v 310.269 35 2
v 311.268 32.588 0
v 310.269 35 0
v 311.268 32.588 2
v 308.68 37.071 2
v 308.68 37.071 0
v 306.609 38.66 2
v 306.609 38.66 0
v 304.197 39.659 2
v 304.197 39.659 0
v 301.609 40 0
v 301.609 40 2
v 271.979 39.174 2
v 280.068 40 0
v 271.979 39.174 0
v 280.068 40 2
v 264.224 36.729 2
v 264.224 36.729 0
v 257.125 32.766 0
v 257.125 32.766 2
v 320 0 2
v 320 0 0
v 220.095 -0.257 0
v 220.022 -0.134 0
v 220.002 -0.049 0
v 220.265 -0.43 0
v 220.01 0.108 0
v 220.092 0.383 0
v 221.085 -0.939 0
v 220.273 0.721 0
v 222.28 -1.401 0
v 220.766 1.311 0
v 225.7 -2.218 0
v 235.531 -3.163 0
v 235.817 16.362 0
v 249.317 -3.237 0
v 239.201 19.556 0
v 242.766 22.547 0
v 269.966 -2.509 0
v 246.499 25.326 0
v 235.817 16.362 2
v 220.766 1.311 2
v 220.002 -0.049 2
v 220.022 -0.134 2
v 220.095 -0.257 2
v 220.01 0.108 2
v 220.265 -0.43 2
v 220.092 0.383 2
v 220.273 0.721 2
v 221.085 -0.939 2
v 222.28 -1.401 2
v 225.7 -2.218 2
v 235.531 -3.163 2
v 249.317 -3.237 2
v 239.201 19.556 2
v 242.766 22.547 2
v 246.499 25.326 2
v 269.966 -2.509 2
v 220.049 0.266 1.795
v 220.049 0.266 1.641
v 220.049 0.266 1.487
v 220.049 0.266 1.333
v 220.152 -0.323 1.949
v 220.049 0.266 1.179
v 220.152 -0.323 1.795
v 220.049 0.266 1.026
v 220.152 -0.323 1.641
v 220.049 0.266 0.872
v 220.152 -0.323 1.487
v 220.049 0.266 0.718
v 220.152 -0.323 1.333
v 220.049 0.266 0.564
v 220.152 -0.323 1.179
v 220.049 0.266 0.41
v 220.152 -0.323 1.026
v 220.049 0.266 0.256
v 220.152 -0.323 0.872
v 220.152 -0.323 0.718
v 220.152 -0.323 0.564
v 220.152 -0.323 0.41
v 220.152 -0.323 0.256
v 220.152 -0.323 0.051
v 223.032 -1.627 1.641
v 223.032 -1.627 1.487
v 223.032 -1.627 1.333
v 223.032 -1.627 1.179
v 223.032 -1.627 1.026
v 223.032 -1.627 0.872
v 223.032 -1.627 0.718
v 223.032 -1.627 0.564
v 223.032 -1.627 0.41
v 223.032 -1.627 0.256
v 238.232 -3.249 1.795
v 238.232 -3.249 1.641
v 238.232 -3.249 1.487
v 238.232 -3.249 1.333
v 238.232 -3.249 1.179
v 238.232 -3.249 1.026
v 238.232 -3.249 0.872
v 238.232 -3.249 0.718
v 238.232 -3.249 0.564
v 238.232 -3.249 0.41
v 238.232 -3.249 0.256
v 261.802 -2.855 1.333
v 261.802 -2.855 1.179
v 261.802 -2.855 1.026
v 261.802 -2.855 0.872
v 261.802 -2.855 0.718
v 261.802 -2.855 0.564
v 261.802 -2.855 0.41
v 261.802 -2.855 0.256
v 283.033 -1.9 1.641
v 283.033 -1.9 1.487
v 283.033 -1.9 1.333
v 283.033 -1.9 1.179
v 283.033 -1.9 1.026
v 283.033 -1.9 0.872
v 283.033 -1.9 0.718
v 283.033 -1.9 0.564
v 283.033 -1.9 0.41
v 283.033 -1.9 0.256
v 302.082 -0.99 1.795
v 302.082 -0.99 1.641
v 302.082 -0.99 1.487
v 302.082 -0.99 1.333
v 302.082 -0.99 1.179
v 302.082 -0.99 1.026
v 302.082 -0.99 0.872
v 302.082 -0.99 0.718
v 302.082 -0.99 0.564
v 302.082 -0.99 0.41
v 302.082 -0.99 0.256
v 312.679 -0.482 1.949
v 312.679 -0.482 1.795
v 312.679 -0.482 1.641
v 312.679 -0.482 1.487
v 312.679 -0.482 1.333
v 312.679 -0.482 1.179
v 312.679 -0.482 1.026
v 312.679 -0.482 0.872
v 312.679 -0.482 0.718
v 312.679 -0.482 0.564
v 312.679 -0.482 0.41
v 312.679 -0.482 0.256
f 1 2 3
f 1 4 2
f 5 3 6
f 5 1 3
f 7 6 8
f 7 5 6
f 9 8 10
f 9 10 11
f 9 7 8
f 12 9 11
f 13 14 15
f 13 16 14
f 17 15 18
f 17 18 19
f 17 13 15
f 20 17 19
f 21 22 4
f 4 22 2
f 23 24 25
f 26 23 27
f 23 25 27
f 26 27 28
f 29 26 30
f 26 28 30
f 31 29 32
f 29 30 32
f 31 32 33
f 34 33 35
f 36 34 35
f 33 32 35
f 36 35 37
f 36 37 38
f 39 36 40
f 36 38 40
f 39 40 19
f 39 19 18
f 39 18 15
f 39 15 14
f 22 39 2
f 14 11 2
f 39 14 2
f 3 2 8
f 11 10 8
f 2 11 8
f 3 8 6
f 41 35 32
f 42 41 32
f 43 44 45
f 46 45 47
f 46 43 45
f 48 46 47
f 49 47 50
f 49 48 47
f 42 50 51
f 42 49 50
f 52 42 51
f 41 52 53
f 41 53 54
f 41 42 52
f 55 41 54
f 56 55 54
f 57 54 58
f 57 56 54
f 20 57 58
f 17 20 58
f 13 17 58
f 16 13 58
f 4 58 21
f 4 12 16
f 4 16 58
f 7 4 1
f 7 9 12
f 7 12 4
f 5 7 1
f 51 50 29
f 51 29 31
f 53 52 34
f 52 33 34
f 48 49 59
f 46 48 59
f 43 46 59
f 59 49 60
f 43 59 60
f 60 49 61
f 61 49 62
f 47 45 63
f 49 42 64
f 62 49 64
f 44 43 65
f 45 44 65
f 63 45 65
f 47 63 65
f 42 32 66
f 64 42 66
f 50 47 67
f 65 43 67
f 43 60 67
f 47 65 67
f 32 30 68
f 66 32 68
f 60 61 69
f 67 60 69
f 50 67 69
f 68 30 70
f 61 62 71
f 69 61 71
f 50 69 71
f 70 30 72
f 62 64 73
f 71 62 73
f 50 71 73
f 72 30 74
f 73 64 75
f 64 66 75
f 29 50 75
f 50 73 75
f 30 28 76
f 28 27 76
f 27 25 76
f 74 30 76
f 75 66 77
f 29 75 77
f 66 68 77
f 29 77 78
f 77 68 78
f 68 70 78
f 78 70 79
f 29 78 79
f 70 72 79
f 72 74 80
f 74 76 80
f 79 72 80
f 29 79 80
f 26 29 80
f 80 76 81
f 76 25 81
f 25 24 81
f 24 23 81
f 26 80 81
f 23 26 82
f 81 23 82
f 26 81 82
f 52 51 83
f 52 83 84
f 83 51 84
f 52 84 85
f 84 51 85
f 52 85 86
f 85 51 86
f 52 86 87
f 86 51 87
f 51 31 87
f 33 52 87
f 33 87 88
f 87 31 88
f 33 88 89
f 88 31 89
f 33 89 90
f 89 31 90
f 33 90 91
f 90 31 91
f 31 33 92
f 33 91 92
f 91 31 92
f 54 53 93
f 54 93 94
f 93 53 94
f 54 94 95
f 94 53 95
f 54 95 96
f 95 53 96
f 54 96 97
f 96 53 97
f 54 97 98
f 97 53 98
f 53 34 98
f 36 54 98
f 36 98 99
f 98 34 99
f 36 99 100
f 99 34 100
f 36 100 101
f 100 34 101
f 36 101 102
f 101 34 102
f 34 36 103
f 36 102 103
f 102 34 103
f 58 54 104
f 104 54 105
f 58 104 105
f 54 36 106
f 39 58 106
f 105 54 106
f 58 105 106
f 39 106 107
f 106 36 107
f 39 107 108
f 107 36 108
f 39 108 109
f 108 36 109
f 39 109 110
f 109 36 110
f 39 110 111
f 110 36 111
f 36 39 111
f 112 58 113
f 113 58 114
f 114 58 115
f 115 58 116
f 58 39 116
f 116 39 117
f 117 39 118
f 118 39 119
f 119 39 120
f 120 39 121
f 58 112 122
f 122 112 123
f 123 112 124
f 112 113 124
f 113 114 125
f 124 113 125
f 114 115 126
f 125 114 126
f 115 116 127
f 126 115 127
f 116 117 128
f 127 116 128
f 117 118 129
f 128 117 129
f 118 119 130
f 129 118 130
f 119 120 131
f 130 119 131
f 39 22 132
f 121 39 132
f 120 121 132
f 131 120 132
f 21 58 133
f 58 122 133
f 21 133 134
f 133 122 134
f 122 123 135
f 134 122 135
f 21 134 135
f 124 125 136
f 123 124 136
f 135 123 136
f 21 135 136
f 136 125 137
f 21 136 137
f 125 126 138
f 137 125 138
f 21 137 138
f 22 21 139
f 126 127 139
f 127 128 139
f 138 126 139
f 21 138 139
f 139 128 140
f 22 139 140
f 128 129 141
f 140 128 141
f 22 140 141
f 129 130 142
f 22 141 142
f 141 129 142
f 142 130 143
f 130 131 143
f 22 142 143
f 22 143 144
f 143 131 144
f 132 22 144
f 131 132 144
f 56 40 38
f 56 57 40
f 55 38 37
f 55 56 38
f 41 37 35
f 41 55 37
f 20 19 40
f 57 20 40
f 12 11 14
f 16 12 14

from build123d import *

# Parameters (mm, degrees)
BOSS_EXTRUDE1_DEPTH = 2
FILLET2_R           = 10
FILLET3_R           = 40
FILLET4_R           = 80


# Read off the part's stored shape, not the designer's step: Boss-Extrude1
with BuildPart() as part:
    # Boss-Extrude1 outline → Boss-Extrude1 (new body)
    with BuildSketch(Plane.XY):
        with BuildLine():
            Line((267.455713264, 40), (240.765620284, 21.3113957))
            Line((240.765620284, 21.3113957), (220.765620284, 1.3113957))
            add(Edge.make_bspline(
                [(220.765620284, 1.3113957), (220.72663316, 1.272408575), (220.493626624, 1.032206135), (220.23379921, 0.706351654), (220.061642382, 0.318391358), (220.011602189, 0.139502643), (219.995925197, -0.002861211), (220.008120727, -0.115534154), (220.062041002, -0.21843611), (220.160266844, -0.337962224), (220.314496952, -0.477861912), (220.482600839, -0.598911233), (220.942116034, -0.893723302), (221.892375739, -1.29761444), (223.520457756, -1.784013523), (225.623980896, -2.227885385), (228.177131144, -2.613315253), (231.164121123, -2.919183773), (234.563486569, -3.13704422), (238.352012883, -3.267079886), (242.499561211, -3.312040739), (246.9689457, -3.284920505), (251.715996006, -3.193186176), (256.691386013, -3.047617228), (261.841513678, -2.857541871), (267.108766757, -2.638288597), (272.431487903, -2.398822278), (277.745717707, -2.151491009), (282.986461691, -1.901966392), (288.089354259, -1.658423301), (292.991669653, -1.423290263), (297.633381787, -1.201968071), (301.957838568, -0.995171113), (305.91027468, -0.808454245), (309.445141673, -0.639954363), (312.505114519, -0.492661458), (315.08917453, -0.359561985), (317.064072102, -0.250243866), (318.667228537, -0.135455891), (319.33987673, -0.063054382), (319.997867718, -0.003800804), (320, 0)],
                knots=[0.495962564, 0.495962564, 0.495962564, 0.495962564, 0.496775026, 0.500888993, 0.502031934, 0.503032492, 0.503621391, 0.504143577, 0.504679782, 0.505310677, 0.506426476, 0.507746346, 0.508370255, 0.514496902, 0.522891546, 0.533497445, 0.54624431, 0.561059304, 0.577878564, 0.59660209, 0.617103044, 0.639204159, 0.662685634, 0.687304872, 0.712801248, 0.738887215, 0.765254171, 0.791582967, 0.817548904, 0.842831994, 0.867120728, 0.890117968, 0.911543748, 0.931132077, 0.948635559, 0.963834135, 0.976537414, 0.986586626, 0.993888175, 0.998423524, 1, 1, 1, 1], degree=3))
            Line((320, 0), (309.282032303, 40))
            Line((309.282032303, 40), (267.455713264, 40))
        make_face()
    extrude(amount=BOSS_EXTRUDE1_DEPTH)

    # Fillet2
    fillet2_edges = [part.edges().sort_by_distance(p)[0] for p in [
        (309.282032303, 40, 1),
    ]]
    fillet(fillet2_edges, radius=FILLET2_R)

    # Fillet3
    fillet3_edges = [part.edges().sort_by_distance(p)[0] for p in [
        (267.455713264, 40, 1),
    ]]
    fillet(fillet3_edges, radius=FILLET3_R)

    # Fillet4
    fillet4_edges = [part.edges().sort_by_distance(p)[0] for p in [
        (240.765620284, 21.3113957, 1),
    ]]
    fillet(fillet4_edges, radius=FILLET4_R)


solid = part.part
